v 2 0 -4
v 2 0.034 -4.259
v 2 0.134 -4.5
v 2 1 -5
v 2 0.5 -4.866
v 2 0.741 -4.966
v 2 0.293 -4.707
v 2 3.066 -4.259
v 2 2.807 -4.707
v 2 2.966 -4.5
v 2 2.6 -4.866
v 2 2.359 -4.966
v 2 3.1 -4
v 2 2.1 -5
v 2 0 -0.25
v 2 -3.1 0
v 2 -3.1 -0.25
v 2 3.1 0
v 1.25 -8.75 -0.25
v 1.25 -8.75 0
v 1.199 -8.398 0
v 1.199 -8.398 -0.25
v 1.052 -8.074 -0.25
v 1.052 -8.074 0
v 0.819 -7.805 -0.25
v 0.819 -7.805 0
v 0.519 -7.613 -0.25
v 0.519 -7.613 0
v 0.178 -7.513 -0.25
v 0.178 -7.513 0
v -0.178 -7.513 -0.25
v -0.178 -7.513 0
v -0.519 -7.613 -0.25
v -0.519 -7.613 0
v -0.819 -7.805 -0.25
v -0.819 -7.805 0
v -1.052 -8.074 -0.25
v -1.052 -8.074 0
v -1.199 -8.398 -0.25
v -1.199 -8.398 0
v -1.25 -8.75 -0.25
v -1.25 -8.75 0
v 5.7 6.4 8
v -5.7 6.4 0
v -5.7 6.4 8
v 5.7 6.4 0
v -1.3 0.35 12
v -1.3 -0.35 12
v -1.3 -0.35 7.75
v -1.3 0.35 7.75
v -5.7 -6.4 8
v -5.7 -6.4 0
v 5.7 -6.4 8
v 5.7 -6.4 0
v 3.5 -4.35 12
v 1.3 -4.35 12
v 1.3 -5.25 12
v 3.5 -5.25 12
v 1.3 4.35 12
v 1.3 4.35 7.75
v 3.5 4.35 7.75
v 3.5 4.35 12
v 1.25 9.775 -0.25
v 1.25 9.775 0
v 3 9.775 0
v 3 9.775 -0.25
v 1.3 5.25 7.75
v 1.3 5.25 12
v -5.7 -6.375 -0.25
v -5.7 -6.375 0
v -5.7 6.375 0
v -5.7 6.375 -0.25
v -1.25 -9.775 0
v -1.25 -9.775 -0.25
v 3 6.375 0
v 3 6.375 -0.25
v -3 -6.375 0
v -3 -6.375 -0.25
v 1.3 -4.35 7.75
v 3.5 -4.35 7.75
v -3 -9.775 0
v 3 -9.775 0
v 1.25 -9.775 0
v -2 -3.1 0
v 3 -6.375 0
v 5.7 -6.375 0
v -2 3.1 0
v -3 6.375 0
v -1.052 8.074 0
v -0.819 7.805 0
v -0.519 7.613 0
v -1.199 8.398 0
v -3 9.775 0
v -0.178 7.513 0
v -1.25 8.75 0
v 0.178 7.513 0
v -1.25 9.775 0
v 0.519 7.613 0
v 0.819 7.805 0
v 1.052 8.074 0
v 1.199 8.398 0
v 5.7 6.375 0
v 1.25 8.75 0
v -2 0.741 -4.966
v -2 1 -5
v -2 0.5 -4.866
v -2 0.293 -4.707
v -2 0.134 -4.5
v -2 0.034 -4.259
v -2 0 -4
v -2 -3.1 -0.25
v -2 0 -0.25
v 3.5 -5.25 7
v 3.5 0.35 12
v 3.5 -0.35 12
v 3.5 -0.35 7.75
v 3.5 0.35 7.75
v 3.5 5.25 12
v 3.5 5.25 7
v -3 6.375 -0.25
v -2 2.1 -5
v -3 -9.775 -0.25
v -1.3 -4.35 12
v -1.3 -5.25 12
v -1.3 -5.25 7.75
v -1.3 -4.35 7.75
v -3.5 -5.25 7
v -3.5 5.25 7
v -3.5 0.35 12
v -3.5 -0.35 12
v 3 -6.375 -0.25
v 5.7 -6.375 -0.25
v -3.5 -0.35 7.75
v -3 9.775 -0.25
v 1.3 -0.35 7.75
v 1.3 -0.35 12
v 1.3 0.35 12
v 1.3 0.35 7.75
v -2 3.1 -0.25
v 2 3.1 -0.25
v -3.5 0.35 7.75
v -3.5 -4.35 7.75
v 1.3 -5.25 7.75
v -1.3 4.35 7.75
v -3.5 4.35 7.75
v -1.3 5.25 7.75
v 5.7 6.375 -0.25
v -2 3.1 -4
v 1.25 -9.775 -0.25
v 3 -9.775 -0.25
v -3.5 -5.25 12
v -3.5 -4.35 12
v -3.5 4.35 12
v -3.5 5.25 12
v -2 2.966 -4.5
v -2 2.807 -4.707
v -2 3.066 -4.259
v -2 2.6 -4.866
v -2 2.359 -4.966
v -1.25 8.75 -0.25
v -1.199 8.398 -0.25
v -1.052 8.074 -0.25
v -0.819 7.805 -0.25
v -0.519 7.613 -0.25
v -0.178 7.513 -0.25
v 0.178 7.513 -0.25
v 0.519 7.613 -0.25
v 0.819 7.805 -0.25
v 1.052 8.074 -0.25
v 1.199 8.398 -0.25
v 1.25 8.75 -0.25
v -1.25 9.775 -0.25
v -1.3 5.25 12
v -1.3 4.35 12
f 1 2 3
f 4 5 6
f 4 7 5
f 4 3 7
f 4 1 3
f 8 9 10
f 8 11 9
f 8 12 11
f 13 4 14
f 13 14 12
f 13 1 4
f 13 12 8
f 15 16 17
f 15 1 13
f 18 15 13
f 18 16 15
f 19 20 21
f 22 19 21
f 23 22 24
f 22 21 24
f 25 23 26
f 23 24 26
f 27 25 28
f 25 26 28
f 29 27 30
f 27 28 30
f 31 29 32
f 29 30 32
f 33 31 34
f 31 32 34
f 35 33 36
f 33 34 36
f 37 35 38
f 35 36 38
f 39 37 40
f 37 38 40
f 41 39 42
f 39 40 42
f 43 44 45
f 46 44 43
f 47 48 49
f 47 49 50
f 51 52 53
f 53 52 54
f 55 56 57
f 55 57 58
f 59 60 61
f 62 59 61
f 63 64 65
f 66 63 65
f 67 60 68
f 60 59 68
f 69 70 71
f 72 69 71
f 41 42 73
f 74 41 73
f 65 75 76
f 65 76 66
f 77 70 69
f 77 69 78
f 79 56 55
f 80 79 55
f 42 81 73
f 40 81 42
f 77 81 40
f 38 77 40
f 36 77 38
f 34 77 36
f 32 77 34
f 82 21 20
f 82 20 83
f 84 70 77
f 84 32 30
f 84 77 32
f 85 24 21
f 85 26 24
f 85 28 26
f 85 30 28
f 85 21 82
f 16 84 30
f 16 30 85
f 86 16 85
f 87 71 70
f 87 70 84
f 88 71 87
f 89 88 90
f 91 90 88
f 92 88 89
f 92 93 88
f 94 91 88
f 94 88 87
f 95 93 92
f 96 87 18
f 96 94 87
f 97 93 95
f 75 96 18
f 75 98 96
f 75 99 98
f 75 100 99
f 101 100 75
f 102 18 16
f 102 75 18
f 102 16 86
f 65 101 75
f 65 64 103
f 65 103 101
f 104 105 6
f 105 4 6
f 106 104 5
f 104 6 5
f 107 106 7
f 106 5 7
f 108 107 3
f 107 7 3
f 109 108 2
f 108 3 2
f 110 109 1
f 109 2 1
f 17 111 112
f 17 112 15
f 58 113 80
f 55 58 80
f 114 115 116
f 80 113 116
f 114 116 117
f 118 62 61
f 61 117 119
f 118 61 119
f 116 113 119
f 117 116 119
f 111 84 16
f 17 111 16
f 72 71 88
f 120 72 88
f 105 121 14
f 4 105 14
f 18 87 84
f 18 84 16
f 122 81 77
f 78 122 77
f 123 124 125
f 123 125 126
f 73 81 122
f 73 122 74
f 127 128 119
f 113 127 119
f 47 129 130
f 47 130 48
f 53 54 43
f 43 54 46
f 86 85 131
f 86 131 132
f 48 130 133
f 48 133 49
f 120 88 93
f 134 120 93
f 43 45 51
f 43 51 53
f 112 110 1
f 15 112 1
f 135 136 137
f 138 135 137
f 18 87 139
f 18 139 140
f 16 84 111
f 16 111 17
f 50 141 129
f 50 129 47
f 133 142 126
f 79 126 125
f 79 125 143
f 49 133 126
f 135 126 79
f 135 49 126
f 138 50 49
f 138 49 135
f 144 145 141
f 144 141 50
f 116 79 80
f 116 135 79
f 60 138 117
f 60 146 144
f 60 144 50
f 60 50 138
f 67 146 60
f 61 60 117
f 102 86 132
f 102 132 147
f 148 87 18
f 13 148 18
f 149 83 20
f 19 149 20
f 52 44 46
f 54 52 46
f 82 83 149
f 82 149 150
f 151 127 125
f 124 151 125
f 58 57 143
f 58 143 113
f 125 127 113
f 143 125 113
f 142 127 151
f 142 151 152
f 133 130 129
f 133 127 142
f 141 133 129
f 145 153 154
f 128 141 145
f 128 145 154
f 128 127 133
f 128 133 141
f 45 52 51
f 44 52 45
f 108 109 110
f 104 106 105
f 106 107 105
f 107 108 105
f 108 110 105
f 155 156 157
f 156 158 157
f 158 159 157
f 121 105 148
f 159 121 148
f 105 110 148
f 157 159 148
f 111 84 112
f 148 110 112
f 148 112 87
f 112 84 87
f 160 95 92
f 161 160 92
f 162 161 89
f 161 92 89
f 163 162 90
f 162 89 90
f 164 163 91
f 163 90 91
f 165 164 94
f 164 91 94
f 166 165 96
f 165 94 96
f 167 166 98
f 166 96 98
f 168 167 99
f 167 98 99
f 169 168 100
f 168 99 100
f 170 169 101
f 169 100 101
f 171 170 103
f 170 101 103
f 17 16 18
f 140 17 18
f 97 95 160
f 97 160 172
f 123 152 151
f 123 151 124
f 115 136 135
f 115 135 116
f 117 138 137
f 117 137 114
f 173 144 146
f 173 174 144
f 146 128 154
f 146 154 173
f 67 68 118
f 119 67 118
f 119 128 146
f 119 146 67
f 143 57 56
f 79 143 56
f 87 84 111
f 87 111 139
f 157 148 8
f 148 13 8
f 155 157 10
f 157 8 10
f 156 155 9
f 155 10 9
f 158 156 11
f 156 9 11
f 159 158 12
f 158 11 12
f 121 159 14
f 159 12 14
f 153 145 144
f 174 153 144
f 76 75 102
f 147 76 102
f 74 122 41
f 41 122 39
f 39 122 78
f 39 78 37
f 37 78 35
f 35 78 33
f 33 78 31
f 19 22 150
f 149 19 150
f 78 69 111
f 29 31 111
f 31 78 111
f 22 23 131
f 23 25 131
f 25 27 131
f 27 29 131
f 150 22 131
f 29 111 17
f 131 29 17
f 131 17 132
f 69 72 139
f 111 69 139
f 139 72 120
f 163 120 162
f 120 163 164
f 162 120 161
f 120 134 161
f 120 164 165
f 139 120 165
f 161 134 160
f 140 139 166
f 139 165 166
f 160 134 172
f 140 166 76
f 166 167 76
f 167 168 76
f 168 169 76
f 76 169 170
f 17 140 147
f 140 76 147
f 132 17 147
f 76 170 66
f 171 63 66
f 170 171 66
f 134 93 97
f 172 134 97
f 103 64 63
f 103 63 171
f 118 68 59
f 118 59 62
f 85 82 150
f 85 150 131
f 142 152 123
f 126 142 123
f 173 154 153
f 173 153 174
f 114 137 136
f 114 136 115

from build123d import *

# Parameters (mm, degrees)
SKETCH_W        = 11.4
SKETCH_H        = 12.8
PAD_DEPTH       = 8
SKETCH001_W     = 11.4
SKETCH001_H     = 19.55
PAD001_DEPTH    = 0.25
SKETCH002_W     = 4
SKETCH002_H     = 6.2
POCKET_DEPTH    = 5
SKETCH003_W     = 10
SKETCH003_H     = 10
POCKET001_DEPTH = 5
POCKET002_DEPTH = 0.251
SKETCH005_W     = 7
SKETCH005_H     = 10.5
PAD002_DEPTH    = 5
SKETCH007_W     = 12
SKETCH007_H     = 4
POCKET003_DEPTH = 4.25
SKETCH008_W     = 2.6
SKETCH008_H     = 20
POCKET004_DEPTH = 4.25
SKETCH009_W     = 4
SKETCH009_H     = 6.2
PAD003_DEPTH    = 5
SKETCH011_W     = 10
SKETCH011_H     = 10
POCKET005_DEPTH = 4.75
FILLET_R        = 1


with BuildPart() as mainbody:
    # Sketch → Pad (new body)
    with BuildSketch(Plane.XY):
        Rectangle(SKETCH_W, SKETCH_H)
    extrude(amount=PAD_DEPTH)


with BuildPart() as frontplate:
    # Sketch001 → Pad001 (new body)
    with BuildSketch(Plane.XY):
        Rectangle(SKETCH001_W, SKETCH001_H)
    extrude(amount=-PAD001_DEPTH)

    # Sketch002 → Pocket (cut)
    with BuildSketch(Plane.XY):
        Rectangle(SKETCH002_W, SKETCH002_H)
    extrude(amount=-POCKET_DEPTH, mode=Mode.SUBTRACT)

    # Sketch003 → Pocket001 (cut)
    with BuildSketch(Plane.XY):
        with Locations((-8, -11.375)):
            Rectangle(SKETCH003_W, SKETCH003_H)
        with Locations((8, -11.375)):
            Rectangle(SKETCH003_W, SKETCH003_H)
        with Locations((8, 11.375)):
            Rectangle(SKETCH003_W, SKETCH003_H)
        with Locations((-8, 11.375)):
            Rectangle(SKETCH003_W, SKETCH003_H)
    extrude(amount=-POCKET001_DEPTH, mode=Mode.SUBTRACT)

    # Sketch004 → Pocket002 (cut, through all)
    with BuildSketch(Plane.XY):
        with BuildLine():
            ThreePointArc((-1.25, 8.75), (0, 7.5), (1.25, 8.75))
            Line((1.25, 18.75), (1.25, 8.75))
            Line((-1.25, 18.75), (1.25, 18.75))
            Line((-1.25, 8.75), (-1.25, 18.75))
        make_face()
        with BuildLine():
            ThreePointArc((1.25, -8.75), (0, -7.5), (-1.25, -8.75))
            Line((-1.25, -8.75), (-1.25, -18.75))
            Line((-1.25, -18.75), (1.25, -18.75))
            Line((1.25, -18.75), (1.25, -8.75))
        make_face()
    extrude(amount=-POCKET002_DEPTH, mode=Mode.SUBTRACT)


with BuildPart() as connectors:
    # Sketch005 (on DatumPlane) → Pad002 (new body)
    with BuildSketch(Plane.XY.offset(7)):
        Rectangle(SKETCH005_W, SKETCH005_H)
    extrude(amount=PAD002_DEPTH)

    # Sketch007 (on Face6 of Pad002) → Pocket003 (cut, symmetric)
    with BuildSketch(Plane.XY.offset(12)):
        with Locations((0, 2.35)):
            Rectangle(SKETCH007_W, SKETCH007_H)
        with Locations((0, -2.35)):
            Rectangle(SKETCH007_W, SKETCH007_H)
    extrude(amount=POCKET003_DEPTH, both=True, mode=Mode.SUBTRACT)

    # Sketch008 (on Face5 of Pocket003) → Pocket004 (cut, symmetric)
    with BuildSketch(Plane.XY.offset(12)):
        Rectangle(SKETCH008_W, SKETCH008_H)
    extrude(amount=POCKET004_DEPTH, both=True, mode=Mode.SUBTRACT)


with BuildPart() as switch:
    # Sketch009 → Pad003 (new body)
    with BuildSketch(Plane.XY):
        Rectangle(SKETCH009_W, SKETCH009_H)
    extrude(amount=-PAD003_DEPTH)

    # Sketch011 (on Face6 of Pad003) → Pocket005 (cut)
    with BuildSketch(Plane(origin=(0, 0, -5), x_dir=(1, 0, 0), z_dir=(0, 0, -1))):
        with Locations((0, 5)):
            Rectangle(SKETCH011_W, SKETCH011_H)
    extrude(amount=-POCKET005_DEPTH, mode=Mode.SUBTRACT)

    # Fillet
    fillet_edges = [switch.edges().sort_by_distance(p)[0] for p in [
        (0, 0, -5),
        (0, 3.1, -5),
    ]]
    fillet(fillet_edges, radius=FILLET_R)


solid = Compound([mainbody.part, frontplate.part, connectors.part, switch.part])
